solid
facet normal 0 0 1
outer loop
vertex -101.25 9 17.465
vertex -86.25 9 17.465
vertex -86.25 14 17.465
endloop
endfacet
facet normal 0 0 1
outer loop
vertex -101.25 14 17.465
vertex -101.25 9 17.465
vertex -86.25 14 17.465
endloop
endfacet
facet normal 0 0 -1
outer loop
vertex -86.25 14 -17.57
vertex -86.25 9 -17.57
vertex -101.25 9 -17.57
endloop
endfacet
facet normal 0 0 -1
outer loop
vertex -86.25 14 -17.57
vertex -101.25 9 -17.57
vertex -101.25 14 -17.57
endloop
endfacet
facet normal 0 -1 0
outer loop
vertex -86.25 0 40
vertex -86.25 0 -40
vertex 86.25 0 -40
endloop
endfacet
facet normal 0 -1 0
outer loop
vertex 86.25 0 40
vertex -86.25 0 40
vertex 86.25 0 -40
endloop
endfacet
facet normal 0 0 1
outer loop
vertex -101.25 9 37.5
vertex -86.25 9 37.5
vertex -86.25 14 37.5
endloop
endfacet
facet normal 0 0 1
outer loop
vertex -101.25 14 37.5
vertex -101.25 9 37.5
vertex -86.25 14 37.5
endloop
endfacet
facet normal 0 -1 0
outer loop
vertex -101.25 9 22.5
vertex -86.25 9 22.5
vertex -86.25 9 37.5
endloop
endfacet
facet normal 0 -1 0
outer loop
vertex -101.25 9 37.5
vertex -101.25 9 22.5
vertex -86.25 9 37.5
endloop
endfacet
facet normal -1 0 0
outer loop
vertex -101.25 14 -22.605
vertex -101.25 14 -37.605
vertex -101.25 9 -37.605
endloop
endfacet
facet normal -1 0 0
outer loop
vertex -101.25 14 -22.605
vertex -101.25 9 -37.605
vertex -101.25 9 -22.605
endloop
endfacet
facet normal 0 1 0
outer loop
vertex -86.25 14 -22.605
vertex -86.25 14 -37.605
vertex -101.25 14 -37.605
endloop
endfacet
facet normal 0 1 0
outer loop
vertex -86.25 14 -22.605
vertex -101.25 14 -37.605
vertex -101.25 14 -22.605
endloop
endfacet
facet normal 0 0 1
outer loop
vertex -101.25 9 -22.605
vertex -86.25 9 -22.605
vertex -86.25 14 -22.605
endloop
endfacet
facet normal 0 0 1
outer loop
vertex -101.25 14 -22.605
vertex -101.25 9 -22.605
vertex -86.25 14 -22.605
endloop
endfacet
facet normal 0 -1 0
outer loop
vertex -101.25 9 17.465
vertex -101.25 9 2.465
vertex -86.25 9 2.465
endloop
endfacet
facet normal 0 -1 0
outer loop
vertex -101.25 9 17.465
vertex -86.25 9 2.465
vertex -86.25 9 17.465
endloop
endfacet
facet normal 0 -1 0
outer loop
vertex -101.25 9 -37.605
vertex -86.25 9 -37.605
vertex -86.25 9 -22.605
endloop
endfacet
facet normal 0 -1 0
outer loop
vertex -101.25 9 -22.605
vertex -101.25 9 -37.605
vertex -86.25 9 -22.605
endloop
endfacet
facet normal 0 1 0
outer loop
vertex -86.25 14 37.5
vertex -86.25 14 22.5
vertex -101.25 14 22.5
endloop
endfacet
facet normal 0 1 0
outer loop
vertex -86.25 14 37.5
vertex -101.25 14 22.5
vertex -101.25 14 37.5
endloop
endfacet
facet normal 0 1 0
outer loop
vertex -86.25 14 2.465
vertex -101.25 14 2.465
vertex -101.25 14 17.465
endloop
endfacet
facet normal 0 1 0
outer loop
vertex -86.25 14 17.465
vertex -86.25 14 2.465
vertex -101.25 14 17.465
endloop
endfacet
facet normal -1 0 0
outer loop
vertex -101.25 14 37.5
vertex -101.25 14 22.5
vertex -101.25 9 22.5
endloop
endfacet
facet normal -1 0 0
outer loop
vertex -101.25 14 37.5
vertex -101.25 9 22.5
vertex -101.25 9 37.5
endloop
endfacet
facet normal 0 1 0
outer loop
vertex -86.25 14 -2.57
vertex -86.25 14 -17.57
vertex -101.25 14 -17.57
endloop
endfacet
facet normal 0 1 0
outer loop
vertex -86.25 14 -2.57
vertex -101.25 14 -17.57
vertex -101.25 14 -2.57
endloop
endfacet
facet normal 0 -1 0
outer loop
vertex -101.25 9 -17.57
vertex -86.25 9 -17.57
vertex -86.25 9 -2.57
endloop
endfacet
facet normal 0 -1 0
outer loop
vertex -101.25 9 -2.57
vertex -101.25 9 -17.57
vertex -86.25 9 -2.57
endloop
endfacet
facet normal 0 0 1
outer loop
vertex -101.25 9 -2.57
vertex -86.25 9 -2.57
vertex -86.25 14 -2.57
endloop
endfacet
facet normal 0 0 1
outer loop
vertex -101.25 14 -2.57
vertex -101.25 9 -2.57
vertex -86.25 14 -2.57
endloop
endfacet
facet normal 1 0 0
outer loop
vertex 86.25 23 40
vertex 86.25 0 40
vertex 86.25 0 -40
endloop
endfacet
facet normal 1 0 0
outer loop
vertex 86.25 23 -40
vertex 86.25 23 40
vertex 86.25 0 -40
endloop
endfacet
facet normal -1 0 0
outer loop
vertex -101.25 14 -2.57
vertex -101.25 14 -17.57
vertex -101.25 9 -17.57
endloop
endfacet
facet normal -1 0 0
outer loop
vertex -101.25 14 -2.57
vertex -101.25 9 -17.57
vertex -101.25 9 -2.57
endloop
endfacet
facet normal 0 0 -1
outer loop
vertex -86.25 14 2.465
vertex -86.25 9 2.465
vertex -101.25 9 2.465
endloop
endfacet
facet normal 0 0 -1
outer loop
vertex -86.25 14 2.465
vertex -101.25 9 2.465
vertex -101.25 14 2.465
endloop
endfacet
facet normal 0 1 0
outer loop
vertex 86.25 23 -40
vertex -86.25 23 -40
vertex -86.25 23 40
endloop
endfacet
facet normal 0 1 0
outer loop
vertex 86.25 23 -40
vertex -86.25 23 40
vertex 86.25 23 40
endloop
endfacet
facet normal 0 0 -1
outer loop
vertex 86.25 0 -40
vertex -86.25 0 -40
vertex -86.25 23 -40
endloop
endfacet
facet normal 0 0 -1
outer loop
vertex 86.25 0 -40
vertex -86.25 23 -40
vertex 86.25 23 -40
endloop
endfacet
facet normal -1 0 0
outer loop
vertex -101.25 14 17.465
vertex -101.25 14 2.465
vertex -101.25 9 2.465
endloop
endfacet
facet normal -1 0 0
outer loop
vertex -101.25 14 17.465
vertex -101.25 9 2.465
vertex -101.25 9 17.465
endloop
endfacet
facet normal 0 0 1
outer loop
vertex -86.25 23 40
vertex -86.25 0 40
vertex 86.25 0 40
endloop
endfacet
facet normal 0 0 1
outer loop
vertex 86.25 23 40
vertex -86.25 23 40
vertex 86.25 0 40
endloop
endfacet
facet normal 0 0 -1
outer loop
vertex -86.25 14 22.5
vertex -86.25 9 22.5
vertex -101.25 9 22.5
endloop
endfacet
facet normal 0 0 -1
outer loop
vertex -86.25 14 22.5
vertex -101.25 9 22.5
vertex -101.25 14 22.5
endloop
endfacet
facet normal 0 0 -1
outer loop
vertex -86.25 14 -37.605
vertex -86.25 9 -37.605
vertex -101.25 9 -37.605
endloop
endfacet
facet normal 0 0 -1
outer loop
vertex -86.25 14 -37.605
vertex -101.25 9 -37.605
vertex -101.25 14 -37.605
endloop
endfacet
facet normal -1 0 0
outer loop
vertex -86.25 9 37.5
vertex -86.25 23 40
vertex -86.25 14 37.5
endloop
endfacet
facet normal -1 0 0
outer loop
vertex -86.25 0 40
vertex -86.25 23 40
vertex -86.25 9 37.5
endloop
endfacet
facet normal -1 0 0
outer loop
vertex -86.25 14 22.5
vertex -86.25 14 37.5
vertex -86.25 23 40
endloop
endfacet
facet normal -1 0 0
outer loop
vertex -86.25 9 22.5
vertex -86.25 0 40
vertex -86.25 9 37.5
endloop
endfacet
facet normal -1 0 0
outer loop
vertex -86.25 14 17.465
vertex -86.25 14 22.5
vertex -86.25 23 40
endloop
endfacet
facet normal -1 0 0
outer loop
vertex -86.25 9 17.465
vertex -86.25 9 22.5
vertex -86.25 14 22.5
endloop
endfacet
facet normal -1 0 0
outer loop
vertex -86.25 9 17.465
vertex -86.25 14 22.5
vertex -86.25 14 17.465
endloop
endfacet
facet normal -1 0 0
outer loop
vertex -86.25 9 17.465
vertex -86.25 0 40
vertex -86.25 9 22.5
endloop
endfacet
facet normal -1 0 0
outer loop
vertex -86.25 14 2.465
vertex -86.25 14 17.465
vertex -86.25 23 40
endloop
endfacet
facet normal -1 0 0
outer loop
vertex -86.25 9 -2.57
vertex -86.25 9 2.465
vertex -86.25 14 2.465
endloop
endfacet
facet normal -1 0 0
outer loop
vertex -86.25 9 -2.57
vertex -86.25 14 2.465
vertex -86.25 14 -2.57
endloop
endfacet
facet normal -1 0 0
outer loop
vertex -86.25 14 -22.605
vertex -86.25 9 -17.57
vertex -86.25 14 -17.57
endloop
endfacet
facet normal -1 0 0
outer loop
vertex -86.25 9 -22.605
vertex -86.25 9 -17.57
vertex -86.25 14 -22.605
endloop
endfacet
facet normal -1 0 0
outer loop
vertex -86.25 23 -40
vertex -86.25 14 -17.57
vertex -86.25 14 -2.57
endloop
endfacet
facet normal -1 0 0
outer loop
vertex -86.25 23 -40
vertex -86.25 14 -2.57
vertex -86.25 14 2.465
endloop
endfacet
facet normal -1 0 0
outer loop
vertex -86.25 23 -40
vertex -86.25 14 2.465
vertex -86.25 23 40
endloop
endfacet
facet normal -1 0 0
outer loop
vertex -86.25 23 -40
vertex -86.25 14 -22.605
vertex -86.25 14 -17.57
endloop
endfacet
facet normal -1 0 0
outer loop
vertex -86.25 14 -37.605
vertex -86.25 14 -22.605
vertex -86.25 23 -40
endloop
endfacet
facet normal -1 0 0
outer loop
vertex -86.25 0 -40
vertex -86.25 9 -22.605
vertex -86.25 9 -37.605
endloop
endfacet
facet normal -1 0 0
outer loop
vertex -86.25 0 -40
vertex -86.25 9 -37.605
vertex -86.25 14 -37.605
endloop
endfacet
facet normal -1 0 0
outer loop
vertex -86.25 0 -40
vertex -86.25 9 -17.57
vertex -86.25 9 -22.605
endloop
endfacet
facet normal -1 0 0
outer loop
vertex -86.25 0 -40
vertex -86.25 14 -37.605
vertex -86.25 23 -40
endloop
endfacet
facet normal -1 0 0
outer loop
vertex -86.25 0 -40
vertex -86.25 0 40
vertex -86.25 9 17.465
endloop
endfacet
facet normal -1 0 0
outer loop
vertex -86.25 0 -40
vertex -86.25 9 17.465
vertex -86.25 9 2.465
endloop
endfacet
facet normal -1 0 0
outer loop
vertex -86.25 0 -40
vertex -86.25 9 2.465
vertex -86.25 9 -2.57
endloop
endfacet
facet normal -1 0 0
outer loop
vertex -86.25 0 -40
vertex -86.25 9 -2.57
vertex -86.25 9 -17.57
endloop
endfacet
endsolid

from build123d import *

# Parameters (mm, degrees)
SKETCH1_W           = 172.5
SKETCH1_H           = 80
BOSS_EXTRUDE1_DEPTH = 23
SKETCH2_W           = 15
SKETCH2_H           = 5
BOSS_EXTRUDE2_DEPTH = 15


with BuildPart() as part:
    # Sketch1 → Boss-Extrude1 (new body)
    with BuildSketch(Plane(origin=(0, 0, 0), x_dir=(1, 0, 0), z_dir=(0, 1, 0))):
        Rectangle(SKETCH1_W, SKETCH1_H)
    extrude(amount=BOSS_EXTRUDE1_DEPTH)

    # Sketch2 → Boss-Extrude2 (add)
    with BuildSketch(Plane.ZY.offset(86.25)):
        with Locations((9.965110339, 11.5)):
            Rectangle(SKETCH2_W, SKETCH2_H)
        with Locations((30, 11.5)):
            Rectangle(SKETCH2_W, SKETCH2_H)
        with Locations((-10.069779322, 11.5)):
            Rectangle(SKETCH2_W, SKETCH2_H)
        with Locations((-30.104668983, 11.5)):
            Rectangle(SKETCH2_W, SKETCH2_H)
    extrude(amount=BOSS_EXTRUDE2_DEPTH)


solid = part.part
